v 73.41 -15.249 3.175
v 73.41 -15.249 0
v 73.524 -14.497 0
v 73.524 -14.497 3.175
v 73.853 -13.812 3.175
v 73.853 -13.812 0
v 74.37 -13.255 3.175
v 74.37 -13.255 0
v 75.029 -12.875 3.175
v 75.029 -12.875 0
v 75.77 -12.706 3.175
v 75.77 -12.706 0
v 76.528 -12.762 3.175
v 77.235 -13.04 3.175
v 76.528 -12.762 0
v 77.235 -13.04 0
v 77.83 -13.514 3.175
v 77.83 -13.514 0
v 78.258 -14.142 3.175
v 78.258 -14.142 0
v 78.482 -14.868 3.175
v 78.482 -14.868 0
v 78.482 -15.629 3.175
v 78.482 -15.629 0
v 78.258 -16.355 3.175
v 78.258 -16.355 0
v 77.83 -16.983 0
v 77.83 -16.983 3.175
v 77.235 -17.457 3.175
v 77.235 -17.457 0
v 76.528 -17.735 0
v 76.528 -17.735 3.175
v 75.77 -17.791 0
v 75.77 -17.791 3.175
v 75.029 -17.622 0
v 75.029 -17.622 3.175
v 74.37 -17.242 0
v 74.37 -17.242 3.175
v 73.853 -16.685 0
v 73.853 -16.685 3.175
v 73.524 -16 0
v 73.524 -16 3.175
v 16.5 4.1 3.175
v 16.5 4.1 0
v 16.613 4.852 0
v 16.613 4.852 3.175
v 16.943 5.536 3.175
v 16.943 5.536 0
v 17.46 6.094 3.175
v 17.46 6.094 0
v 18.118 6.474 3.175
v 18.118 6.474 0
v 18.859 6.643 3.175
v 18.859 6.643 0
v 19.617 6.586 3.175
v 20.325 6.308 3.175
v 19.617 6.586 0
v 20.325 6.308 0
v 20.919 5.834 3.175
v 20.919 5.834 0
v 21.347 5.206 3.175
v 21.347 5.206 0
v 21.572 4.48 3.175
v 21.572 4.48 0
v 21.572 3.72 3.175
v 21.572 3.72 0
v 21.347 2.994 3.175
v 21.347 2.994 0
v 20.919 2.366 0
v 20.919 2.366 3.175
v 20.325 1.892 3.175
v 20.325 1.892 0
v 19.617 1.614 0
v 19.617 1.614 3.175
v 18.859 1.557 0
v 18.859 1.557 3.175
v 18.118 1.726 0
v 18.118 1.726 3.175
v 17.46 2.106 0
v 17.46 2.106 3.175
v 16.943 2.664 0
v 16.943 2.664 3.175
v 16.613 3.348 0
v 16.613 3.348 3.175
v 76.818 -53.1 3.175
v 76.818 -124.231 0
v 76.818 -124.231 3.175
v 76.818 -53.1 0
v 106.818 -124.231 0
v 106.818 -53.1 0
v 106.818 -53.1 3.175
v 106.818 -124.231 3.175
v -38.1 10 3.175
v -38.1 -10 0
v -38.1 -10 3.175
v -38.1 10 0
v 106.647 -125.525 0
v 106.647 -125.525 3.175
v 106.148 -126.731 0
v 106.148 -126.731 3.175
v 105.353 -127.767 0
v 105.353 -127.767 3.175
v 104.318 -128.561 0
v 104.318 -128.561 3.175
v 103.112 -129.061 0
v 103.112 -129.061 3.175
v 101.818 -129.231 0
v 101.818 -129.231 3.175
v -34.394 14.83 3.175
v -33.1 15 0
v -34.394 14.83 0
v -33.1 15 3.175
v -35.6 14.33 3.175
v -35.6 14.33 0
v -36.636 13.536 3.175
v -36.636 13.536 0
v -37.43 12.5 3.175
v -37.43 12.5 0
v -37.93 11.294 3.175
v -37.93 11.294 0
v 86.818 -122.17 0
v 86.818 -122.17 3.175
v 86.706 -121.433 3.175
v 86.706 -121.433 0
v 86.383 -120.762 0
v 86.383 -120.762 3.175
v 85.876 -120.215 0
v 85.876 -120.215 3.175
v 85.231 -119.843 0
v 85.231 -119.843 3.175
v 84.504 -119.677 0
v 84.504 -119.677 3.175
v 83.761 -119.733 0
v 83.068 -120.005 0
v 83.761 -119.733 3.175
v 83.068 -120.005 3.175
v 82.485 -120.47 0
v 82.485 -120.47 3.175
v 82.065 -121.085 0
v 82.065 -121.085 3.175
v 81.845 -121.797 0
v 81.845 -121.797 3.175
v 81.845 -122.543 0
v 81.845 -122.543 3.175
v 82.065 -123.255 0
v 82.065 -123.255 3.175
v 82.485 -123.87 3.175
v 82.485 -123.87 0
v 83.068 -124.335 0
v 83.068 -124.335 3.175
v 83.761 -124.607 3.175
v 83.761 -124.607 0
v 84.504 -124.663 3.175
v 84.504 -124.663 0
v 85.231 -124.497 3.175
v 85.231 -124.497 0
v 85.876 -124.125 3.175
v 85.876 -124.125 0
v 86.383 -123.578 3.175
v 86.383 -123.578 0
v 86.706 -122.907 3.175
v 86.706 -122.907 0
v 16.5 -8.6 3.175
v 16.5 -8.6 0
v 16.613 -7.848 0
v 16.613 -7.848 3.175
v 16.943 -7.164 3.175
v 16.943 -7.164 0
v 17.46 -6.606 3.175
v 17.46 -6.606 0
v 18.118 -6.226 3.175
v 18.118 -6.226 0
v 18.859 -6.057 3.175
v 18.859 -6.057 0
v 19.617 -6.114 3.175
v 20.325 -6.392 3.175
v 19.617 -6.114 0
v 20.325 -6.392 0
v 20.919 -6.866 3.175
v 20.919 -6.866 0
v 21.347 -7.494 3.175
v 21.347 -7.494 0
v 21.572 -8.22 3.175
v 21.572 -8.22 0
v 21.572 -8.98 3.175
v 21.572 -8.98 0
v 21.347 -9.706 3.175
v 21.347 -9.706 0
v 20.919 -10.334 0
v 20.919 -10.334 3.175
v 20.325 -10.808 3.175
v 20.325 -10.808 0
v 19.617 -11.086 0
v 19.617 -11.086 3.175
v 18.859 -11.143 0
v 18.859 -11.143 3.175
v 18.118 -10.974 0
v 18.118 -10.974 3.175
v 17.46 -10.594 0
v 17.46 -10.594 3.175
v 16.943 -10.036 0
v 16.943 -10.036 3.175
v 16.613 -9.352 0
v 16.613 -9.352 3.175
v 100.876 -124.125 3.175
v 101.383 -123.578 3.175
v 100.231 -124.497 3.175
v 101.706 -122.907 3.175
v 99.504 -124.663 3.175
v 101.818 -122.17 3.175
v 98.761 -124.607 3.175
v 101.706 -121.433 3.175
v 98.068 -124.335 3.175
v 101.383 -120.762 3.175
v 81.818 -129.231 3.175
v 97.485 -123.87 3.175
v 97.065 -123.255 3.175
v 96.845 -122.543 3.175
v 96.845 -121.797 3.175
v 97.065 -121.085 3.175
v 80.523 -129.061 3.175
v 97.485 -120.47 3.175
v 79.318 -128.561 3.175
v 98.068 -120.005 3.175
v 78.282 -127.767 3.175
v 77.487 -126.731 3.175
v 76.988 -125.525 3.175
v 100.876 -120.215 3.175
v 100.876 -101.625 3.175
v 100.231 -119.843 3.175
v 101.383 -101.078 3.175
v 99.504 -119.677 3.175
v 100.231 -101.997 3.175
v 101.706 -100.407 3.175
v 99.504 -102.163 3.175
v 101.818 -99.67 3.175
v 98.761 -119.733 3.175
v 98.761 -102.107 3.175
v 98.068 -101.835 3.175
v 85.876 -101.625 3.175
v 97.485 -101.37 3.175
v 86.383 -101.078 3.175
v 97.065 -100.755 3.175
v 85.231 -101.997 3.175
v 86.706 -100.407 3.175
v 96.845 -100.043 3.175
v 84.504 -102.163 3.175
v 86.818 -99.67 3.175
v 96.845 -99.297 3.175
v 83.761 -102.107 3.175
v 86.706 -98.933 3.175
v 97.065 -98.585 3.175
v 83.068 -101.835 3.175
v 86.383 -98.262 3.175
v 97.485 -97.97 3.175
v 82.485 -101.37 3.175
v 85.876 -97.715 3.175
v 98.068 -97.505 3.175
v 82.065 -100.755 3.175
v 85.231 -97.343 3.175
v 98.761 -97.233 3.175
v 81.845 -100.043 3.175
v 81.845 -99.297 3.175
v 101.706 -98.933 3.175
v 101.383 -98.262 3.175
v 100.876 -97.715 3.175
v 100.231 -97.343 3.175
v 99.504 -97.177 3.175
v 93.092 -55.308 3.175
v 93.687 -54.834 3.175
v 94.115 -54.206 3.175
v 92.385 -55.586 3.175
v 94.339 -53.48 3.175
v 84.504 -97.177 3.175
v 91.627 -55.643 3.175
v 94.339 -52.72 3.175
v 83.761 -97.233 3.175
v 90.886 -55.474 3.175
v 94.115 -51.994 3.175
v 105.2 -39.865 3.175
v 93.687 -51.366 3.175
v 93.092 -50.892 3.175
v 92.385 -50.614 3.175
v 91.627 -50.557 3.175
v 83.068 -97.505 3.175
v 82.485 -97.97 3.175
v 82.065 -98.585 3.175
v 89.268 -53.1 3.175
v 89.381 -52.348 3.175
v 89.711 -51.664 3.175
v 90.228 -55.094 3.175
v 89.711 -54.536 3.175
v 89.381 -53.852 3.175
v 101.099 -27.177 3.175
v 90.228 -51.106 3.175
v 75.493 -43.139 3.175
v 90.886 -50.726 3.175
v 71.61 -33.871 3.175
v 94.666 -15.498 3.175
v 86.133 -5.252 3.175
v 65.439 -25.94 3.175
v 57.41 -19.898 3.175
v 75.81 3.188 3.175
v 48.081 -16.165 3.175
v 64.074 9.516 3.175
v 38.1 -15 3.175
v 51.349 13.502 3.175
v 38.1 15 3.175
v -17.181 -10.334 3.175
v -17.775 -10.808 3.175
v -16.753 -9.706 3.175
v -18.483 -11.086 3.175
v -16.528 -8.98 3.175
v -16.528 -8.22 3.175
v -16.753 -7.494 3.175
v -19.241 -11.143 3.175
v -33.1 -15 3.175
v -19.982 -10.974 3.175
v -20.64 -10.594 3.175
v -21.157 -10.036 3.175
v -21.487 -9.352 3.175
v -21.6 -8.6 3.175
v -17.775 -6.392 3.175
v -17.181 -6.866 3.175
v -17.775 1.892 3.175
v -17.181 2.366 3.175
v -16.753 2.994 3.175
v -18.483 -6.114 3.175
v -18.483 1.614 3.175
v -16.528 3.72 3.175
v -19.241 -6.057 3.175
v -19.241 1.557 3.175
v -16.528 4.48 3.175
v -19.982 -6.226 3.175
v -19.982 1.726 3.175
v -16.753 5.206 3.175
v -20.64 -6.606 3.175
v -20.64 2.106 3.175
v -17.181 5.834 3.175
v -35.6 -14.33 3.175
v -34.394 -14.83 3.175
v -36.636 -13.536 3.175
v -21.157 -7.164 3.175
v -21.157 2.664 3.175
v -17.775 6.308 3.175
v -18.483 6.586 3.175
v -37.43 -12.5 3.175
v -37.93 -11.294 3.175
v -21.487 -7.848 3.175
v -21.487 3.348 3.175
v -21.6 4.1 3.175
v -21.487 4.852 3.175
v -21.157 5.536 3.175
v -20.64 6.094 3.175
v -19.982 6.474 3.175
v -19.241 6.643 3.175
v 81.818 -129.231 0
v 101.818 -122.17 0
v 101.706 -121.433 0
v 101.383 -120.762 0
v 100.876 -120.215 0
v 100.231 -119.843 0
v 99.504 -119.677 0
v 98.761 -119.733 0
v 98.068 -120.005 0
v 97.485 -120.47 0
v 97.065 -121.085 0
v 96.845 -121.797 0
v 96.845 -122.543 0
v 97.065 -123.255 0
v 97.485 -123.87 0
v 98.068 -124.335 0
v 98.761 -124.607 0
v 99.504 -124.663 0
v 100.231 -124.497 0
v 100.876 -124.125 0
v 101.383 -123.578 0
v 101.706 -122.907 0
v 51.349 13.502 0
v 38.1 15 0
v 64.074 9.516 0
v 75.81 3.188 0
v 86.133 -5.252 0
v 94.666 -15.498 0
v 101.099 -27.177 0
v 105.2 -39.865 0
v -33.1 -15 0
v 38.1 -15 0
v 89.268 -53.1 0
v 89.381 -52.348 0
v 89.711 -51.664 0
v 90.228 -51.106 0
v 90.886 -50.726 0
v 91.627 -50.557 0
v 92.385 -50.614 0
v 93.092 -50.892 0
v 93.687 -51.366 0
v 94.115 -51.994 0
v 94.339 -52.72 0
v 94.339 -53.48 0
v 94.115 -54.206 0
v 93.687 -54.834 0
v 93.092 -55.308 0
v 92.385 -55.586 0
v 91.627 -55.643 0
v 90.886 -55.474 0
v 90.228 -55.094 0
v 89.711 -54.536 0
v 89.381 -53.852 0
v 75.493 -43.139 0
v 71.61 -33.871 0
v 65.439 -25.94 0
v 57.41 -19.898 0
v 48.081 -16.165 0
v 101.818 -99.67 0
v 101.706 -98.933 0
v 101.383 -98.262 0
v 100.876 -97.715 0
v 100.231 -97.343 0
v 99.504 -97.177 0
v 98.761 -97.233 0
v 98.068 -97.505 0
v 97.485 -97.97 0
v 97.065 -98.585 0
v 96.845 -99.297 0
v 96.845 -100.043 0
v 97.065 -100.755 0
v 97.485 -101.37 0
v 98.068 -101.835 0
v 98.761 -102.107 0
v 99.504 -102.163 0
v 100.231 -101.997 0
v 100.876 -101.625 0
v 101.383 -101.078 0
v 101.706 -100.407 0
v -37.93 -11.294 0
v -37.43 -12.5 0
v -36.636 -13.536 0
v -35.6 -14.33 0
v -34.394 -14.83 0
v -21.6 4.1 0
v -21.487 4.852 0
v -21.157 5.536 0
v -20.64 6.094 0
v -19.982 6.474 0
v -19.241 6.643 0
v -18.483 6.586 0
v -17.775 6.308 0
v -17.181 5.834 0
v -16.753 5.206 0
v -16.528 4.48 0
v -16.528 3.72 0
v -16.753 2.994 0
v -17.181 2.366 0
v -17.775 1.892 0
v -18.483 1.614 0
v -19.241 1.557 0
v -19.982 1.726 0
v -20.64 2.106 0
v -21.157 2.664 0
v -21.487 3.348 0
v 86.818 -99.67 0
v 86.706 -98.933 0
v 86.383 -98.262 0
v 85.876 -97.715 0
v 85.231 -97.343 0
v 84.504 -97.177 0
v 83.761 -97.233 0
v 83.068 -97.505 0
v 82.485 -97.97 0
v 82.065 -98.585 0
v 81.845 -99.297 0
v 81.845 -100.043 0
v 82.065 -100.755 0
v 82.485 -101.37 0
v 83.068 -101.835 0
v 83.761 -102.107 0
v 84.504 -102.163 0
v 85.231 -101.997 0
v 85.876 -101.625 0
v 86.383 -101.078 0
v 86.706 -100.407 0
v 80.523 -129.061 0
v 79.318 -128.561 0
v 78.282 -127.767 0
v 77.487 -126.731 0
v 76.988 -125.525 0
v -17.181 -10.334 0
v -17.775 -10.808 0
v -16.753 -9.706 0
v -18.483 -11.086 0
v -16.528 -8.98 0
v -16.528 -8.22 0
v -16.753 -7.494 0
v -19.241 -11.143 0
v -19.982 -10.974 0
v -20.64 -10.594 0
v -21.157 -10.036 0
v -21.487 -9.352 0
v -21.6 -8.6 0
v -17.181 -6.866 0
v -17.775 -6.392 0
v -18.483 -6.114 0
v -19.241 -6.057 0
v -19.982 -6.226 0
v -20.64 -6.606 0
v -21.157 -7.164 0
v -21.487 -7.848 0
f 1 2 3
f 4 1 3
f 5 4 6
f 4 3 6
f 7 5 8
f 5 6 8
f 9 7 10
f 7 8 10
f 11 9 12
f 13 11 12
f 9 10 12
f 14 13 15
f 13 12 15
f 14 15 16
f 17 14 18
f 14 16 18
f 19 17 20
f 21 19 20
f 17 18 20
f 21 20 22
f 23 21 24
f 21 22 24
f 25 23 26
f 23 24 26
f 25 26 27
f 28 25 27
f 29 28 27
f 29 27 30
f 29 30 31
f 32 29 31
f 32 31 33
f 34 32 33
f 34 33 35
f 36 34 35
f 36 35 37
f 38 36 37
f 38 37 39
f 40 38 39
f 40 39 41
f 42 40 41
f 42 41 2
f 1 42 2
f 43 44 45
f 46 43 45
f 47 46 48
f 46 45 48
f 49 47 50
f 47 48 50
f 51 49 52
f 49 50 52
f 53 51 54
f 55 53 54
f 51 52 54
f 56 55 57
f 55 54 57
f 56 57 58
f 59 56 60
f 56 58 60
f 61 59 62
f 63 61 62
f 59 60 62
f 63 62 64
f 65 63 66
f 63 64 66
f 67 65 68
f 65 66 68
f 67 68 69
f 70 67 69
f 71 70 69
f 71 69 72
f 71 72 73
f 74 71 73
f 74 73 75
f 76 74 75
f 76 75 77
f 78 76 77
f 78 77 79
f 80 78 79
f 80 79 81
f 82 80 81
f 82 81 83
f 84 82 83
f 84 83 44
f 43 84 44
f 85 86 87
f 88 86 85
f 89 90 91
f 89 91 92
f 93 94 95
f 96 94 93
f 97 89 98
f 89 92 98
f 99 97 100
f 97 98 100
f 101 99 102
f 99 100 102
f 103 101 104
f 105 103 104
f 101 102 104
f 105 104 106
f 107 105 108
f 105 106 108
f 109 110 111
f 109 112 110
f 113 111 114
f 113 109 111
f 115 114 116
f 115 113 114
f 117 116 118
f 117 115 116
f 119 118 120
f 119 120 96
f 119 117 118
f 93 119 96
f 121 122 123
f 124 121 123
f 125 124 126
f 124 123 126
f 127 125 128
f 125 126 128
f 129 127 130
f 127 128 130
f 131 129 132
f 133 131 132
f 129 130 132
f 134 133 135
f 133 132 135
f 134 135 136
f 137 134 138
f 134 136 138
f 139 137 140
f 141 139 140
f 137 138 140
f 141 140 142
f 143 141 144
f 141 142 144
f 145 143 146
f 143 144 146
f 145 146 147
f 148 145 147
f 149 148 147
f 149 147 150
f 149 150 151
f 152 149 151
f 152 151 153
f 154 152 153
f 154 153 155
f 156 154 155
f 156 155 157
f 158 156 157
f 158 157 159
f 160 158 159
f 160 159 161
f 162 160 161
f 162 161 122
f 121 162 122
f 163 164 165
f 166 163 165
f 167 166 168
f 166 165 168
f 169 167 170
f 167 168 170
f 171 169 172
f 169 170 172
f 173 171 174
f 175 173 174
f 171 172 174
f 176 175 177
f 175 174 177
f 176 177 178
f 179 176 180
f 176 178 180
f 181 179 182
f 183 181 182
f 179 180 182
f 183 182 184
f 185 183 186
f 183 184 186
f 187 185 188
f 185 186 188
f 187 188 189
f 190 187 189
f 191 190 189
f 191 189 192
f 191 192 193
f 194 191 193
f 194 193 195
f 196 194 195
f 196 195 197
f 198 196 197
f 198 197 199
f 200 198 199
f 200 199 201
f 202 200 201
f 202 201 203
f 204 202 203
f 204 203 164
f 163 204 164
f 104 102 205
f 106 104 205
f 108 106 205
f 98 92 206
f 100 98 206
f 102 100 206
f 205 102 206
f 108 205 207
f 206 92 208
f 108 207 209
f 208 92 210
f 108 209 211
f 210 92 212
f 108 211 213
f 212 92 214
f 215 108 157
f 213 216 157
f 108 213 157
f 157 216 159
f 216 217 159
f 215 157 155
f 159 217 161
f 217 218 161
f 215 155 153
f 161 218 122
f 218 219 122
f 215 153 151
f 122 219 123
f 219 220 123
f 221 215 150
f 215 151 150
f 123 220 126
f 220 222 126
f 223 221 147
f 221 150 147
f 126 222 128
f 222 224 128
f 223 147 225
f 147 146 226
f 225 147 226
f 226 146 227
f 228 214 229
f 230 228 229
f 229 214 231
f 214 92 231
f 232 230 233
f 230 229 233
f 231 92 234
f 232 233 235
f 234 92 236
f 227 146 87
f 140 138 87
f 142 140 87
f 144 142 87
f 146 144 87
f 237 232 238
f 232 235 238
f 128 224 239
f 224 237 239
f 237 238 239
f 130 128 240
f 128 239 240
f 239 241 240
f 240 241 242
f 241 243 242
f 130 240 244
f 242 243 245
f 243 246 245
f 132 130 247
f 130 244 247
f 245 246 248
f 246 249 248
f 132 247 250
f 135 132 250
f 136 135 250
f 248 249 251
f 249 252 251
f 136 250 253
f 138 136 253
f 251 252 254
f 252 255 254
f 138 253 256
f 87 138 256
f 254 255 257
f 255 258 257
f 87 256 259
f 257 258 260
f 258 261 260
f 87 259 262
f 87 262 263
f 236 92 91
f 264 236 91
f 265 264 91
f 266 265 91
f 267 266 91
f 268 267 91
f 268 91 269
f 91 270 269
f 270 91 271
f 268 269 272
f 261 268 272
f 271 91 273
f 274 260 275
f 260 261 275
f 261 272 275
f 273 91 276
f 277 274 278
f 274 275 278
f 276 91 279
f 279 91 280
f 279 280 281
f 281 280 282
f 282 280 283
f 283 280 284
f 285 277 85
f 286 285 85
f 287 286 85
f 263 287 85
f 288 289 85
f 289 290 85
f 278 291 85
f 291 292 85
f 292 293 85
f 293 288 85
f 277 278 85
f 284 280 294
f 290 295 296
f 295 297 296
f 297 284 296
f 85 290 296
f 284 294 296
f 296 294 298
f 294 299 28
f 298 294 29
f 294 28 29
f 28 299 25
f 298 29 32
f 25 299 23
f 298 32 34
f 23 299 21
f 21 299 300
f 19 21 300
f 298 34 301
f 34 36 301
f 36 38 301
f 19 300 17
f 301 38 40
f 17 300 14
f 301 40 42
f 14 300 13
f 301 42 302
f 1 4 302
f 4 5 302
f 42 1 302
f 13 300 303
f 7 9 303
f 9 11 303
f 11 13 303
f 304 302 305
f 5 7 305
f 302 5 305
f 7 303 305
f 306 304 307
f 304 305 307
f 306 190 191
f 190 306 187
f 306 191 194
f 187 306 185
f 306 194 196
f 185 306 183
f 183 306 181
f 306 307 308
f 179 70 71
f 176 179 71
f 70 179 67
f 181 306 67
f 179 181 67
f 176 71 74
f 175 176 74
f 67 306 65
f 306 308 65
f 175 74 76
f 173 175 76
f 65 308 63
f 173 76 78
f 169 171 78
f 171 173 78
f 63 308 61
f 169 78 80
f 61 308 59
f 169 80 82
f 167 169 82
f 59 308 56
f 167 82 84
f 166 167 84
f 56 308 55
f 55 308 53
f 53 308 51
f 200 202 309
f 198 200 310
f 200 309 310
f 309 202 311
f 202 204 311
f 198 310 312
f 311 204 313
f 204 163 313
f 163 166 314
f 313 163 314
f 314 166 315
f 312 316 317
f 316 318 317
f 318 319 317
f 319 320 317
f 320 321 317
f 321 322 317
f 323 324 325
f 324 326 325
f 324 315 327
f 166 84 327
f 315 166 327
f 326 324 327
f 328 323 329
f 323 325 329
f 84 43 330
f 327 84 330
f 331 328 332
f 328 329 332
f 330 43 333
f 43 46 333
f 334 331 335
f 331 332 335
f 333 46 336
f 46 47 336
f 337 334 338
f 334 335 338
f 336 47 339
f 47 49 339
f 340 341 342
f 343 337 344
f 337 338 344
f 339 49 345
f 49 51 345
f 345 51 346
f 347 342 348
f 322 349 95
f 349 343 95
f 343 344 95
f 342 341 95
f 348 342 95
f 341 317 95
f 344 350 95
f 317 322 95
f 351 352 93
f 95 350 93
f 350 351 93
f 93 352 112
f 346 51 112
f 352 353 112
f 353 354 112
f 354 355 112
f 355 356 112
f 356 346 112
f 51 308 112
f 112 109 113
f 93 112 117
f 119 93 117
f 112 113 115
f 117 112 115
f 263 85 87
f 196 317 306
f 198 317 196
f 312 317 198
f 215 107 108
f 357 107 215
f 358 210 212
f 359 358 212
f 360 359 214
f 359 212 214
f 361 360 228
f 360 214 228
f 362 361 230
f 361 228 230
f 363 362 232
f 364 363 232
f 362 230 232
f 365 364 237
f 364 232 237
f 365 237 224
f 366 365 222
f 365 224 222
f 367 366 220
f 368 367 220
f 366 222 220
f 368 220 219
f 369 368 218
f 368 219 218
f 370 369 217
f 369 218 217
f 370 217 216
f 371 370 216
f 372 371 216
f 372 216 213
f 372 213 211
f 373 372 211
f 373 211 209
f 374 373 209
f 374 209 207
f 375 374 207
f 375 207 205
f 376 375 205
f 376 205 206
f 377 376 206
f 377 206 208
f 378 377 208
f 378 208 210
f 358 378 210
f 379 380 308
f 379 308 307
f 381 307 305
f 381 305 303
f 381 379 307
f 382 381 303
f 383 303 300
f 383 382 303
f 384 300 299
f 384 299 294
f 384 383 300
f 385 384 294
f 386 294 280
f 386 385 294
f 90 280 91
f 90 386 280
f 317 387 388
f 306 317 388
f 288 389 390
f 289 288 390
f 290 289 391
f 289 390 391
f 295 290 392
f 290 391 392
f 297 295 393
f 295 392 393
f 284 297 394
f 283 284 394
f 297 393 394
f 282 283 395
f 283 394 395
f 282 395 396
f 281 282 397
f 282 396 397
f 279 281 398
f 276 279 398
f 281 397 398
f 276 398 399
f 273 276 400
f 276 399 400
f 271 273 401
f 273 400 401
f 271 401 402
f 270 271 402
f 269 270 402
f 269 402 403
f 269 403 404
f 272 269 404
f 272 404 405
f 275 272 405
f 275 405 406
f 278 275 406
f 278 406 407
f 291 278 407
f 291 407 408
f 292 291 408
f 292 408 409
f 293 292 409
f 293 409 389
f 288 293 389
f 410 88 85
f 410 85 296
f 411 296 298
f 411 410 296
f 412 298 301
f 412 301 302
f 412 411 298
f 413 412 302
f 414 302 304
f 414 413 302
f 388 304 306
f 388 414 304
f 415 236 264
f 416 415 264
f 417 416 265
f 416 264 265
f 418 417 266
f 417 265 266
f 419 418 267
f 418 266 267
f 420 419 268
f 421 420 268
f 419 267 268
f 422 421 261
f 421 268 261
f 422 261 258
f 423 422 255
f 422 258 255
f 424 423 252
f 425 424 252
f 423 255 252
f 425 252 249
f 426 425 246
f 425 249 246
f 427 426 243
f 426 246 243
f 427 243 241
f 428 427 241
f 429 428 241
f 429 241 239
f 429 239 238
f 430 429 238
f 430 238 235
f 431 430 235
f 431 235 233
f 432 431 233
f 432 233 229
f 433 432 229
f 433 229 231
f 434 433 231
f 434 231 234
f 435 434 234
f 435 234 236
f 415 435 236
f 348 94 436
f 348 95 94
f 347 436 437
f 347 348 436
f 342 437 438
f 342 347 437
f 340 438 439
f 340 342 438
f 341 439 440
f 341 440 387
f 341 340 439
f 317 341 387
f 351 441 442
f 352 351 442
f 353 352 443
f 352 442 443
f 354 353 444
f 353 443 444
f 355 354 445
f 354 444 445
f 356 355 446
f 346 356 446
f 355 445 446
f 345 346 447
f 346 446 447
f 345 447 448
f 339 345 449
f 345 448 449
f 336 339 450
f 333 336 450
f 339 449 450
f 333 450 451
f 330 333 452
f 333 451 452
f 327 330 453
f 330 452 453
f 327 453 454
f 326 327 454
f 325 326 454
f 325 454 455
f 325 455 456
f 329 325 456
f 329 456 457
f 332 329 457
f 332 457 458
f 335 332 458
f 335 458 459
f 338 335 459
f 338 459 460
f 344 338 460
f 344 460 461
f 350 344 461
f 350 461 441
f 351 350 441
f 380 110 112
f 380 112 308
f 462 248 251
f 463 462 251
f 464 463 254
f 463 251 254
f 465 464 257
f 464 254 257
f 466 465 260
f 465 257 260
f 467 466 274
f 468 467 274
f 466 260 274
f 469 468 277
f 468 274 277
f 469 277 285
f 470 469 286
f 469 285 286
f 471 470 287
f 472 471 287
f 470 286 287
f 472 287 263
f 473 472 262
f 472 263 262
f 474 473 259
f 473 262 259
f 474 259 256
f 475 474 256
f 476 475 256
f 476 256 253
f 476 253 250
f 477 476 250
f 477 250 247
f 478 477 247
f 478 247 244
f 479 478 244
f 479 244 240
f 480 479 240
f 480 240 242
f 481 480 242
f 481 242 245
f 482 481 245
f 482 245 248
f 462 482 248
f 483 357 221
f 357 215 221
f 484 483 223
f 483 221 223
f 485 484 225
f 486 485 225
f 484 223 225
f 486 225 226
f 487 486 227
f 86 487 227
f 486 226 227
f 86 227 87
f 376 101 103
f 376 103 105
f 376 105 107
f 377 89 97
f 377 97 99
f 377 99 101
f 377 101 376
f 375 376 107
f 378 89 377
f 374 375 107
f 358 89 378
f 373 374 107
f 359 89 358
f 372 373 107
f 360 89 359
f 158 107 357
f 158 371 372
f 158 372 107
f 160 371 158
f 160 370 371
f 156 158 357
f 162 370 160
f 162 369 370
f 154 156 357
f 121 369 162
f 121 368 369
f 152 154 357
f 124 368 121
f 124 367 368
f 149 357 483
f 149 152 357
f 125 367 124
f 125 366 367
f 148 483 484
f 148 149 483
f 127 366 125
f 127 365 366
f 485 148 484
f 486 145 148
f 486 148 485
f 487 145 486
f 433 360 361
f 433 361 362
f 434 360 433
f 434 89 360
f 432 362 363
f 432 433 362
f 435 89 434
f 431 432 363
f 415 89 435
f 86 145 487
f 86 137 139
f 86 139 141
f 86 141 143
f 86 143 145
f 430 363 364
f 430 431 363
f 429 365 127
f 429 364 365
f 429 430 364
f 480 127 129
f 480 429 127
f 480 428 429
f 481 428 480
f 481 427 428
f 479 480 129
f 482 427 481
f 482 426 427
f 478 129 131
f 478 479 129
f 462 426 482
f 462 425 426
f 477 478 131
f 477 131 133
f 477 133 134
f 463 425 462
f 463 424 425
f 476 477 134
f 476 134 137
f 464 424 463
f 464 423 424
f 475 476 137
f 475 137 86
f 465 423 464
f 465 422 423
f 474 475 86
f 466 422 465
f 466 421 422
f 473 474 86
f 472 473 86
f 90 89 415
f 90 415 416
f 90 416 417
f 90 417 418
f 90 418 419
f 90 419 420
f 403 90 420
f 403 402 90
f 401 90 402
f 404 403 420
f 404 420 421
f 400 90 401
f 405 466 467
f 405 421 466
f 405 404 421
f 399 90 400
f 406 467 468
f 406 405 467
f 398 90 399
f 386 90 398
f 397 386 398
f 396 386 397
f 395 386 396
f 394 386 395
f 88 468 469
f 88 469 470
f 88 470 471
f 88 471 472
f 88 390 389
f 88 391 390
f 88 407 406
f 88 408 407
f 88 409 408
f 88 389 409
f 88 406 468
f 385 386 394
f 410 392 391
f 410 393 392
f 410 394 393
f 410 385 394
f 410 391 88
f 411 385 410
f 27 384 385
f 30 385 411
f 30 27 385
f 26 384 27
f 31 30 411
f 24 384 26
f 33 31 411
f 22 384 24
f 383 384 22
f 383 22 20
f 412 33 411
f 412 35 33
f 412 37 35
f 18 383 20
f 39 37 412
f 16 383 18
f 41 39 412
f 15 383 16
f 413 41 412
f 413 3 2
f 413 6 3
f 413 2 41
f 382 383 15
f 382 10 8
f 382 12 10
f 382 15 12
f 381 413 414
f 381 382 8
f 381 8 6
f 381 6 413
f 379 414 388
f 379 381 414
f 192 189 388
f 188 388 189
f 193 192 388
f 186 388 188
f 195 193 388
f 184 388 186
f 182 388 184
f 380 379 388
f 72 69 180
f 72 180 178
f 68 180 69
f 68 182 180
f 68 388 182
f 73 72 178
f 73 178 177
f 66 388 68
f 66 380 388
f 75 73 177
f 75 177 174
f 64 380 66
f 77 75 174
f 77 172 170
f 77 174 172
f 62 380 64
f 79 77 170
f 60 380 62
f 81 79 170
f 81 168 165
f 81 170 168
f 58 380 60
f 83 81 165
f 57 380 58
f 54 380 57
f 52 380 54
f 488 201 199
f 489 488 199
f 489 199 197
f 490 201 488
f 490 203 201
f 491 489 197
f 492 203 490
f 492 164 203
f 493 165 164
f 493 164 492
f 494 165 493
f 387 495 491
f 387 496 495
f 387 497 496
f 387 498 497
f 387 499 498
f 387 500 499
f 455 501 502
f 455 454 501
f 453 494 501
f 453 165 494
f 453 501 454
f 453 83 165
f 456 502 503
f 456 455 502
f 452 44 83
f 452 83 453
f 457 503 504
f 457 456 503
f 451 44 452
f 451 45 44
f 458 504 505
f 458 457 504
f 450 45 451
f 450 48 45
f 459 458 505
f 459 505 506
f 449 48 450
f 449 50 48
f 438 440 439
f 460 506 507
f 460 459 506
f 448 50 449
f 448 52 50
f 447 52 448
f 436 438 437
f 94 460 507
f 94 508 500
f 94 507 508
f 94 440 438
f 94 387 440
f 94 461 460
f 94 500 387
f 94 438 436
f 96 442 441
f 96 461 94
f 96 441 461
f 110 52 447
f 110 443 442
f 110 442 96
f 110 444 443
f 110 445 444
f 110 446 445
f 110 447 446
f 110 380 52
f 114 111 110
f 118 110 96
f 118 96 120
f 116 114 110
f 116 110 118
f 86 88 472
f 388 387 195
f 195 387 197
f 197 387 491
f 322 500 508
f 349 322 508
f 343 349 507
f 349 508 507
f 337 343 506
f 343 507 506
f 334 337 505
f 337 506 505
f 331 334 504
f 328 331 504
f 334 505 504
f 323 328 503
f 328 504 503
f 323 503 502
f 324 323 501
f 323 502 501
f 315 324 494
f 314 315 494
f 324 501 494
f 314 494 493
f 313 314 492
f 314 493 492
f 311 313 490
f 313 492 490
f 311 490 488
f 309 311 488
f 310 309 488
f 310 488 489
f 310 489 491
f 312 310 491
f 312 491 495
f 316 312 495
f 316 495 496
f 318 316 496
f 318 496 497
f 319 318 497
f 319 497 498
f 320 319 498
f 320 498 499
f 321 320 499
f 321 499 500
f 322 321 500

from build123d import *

# Parameters (mm, degrees)
SKETCH1_W           = 76.2
SKETCH1_H           = 30
BOSS_EXTRUDE1_DEPTH = 3.175
BOSS_EXTRUDE2_DEPTH = 3.175
FILLET1_R           = 5
SKETCH5_R           = 2.5
CUT_EXTRUDE2_DEPTH  = 168.692302315
SKETCH6_R           = 2.55
CUT_EXTRUDE3_DEPTH  = 168.692302315
SKETCH7_R           = 2.55
CUT_EXTRUDE4_DEPTH  = 10


with BuildPart() as part:
    # Sketch1 → Boss-Extrude1 (new body)
    with BuildSketch(Plane.XY):
        Rectangle(SKETCH1_W, SKETCH1_H)
    extrude(amount=BOSS_EXTRUDE1_DEPTH)

    # Sketch3 → Boss-Extrude2 (add)
    with BuildSketch(Plane(origin=(0, 0, 0), x_dir=(-1, 0, 0), z_dir=(0, 0, -1))):
        with BuildLine():
            ThreePointArc((-38.1, 15), (-86.132736854, -5.252023618), (-106.8175, -53.1))
            Line((-106.8175, -53.1), (-106.8175, -129.230992121))
            Line((-106.8175, -129.230992121), (-76.8175, -129.230992121))
            Line((-76.8175, -129.230992121), (-76.8175, -53.1))
            ThreePointArc((-76.8175, -53.1), (-65.439370351, -25.940034949), (-38.1, -15))
            Line((-38.1, -15), (-38.1, 15))
        make_face()
    extrude(amount=-BOSS_EXTRUDE2_DEPTH)

    # Fillet1
    fillet1_edges = [part.edges().sort_by_distance(p)[0] for p in [
        (106.8175, -129.230992121, 1.5875),
        (76.8175, -129.230992121, 1.5875),
        (-38.1, 15, 1.5875),
        (-38.1, -15, 1.5875),
    ]]
    fillet(fillet1_edges, radius=FILLET1_R)

    # Sketch5 → Cut-Extrude2 (cut, through all)
    with BuildSketch(Plane.XY.offset(3.175)):
        with Locations((99.3175, -122.17)):
            Circle(SKETCH5_R)
        with Locations((84.3175, -122.17)):
            Circle(SKETCH5_R)
        with Locations((84.3175, -99.67)):
            Circle(SKETCH5_R)
        with Locations((99.3175, -99.67)):
            Circle(SKETCH5_R)
    extrude(amount=-CUT_EXTRUDE2_DEPTH, mode=Mode.SUBTRACT)

    # Sketch6 → Cut-Extrude3 (cut, through all)
    with BuildSketch(Plane(origin=(0, 0, 0), x_dir=(-1, 0, 0), z_dir=(0, 0, -1))):
        with Locations((-19.05, -8.6)):
            Circle(SKETCH6_R)
        with Locations((19.05, -8.6)):
            Circle(SKETCH6_R)
        with Locations((19.05, 4.1)):
            Circle(SKETCH6_R)
        with Locations((-19.05, 4.1)):
            Circle(SKETCH6_R)
    extrude(amount=-CUT_EXTRUDE3_DEPTH, mode=Mode.SUBTRACT)

    # Sketch7 → Cut-Extrude4 (cut)
    with BuildSketch(Plane(origin=(0, 0, 0), x_dir=(-1, 0, 0), z_dir=(0, 0, -1))):
        with Locations((-75.960370634, -15.248517141)):
            Circle(SKETCH7_R)
        with Locations((-91.8175, -53.1)):
            Circle(SKETCH7_R)
    extrude(amount=-CUT_EXTRUDE4_DEPTH, mode=Mode.SUBTRACT)


solid = part.part
